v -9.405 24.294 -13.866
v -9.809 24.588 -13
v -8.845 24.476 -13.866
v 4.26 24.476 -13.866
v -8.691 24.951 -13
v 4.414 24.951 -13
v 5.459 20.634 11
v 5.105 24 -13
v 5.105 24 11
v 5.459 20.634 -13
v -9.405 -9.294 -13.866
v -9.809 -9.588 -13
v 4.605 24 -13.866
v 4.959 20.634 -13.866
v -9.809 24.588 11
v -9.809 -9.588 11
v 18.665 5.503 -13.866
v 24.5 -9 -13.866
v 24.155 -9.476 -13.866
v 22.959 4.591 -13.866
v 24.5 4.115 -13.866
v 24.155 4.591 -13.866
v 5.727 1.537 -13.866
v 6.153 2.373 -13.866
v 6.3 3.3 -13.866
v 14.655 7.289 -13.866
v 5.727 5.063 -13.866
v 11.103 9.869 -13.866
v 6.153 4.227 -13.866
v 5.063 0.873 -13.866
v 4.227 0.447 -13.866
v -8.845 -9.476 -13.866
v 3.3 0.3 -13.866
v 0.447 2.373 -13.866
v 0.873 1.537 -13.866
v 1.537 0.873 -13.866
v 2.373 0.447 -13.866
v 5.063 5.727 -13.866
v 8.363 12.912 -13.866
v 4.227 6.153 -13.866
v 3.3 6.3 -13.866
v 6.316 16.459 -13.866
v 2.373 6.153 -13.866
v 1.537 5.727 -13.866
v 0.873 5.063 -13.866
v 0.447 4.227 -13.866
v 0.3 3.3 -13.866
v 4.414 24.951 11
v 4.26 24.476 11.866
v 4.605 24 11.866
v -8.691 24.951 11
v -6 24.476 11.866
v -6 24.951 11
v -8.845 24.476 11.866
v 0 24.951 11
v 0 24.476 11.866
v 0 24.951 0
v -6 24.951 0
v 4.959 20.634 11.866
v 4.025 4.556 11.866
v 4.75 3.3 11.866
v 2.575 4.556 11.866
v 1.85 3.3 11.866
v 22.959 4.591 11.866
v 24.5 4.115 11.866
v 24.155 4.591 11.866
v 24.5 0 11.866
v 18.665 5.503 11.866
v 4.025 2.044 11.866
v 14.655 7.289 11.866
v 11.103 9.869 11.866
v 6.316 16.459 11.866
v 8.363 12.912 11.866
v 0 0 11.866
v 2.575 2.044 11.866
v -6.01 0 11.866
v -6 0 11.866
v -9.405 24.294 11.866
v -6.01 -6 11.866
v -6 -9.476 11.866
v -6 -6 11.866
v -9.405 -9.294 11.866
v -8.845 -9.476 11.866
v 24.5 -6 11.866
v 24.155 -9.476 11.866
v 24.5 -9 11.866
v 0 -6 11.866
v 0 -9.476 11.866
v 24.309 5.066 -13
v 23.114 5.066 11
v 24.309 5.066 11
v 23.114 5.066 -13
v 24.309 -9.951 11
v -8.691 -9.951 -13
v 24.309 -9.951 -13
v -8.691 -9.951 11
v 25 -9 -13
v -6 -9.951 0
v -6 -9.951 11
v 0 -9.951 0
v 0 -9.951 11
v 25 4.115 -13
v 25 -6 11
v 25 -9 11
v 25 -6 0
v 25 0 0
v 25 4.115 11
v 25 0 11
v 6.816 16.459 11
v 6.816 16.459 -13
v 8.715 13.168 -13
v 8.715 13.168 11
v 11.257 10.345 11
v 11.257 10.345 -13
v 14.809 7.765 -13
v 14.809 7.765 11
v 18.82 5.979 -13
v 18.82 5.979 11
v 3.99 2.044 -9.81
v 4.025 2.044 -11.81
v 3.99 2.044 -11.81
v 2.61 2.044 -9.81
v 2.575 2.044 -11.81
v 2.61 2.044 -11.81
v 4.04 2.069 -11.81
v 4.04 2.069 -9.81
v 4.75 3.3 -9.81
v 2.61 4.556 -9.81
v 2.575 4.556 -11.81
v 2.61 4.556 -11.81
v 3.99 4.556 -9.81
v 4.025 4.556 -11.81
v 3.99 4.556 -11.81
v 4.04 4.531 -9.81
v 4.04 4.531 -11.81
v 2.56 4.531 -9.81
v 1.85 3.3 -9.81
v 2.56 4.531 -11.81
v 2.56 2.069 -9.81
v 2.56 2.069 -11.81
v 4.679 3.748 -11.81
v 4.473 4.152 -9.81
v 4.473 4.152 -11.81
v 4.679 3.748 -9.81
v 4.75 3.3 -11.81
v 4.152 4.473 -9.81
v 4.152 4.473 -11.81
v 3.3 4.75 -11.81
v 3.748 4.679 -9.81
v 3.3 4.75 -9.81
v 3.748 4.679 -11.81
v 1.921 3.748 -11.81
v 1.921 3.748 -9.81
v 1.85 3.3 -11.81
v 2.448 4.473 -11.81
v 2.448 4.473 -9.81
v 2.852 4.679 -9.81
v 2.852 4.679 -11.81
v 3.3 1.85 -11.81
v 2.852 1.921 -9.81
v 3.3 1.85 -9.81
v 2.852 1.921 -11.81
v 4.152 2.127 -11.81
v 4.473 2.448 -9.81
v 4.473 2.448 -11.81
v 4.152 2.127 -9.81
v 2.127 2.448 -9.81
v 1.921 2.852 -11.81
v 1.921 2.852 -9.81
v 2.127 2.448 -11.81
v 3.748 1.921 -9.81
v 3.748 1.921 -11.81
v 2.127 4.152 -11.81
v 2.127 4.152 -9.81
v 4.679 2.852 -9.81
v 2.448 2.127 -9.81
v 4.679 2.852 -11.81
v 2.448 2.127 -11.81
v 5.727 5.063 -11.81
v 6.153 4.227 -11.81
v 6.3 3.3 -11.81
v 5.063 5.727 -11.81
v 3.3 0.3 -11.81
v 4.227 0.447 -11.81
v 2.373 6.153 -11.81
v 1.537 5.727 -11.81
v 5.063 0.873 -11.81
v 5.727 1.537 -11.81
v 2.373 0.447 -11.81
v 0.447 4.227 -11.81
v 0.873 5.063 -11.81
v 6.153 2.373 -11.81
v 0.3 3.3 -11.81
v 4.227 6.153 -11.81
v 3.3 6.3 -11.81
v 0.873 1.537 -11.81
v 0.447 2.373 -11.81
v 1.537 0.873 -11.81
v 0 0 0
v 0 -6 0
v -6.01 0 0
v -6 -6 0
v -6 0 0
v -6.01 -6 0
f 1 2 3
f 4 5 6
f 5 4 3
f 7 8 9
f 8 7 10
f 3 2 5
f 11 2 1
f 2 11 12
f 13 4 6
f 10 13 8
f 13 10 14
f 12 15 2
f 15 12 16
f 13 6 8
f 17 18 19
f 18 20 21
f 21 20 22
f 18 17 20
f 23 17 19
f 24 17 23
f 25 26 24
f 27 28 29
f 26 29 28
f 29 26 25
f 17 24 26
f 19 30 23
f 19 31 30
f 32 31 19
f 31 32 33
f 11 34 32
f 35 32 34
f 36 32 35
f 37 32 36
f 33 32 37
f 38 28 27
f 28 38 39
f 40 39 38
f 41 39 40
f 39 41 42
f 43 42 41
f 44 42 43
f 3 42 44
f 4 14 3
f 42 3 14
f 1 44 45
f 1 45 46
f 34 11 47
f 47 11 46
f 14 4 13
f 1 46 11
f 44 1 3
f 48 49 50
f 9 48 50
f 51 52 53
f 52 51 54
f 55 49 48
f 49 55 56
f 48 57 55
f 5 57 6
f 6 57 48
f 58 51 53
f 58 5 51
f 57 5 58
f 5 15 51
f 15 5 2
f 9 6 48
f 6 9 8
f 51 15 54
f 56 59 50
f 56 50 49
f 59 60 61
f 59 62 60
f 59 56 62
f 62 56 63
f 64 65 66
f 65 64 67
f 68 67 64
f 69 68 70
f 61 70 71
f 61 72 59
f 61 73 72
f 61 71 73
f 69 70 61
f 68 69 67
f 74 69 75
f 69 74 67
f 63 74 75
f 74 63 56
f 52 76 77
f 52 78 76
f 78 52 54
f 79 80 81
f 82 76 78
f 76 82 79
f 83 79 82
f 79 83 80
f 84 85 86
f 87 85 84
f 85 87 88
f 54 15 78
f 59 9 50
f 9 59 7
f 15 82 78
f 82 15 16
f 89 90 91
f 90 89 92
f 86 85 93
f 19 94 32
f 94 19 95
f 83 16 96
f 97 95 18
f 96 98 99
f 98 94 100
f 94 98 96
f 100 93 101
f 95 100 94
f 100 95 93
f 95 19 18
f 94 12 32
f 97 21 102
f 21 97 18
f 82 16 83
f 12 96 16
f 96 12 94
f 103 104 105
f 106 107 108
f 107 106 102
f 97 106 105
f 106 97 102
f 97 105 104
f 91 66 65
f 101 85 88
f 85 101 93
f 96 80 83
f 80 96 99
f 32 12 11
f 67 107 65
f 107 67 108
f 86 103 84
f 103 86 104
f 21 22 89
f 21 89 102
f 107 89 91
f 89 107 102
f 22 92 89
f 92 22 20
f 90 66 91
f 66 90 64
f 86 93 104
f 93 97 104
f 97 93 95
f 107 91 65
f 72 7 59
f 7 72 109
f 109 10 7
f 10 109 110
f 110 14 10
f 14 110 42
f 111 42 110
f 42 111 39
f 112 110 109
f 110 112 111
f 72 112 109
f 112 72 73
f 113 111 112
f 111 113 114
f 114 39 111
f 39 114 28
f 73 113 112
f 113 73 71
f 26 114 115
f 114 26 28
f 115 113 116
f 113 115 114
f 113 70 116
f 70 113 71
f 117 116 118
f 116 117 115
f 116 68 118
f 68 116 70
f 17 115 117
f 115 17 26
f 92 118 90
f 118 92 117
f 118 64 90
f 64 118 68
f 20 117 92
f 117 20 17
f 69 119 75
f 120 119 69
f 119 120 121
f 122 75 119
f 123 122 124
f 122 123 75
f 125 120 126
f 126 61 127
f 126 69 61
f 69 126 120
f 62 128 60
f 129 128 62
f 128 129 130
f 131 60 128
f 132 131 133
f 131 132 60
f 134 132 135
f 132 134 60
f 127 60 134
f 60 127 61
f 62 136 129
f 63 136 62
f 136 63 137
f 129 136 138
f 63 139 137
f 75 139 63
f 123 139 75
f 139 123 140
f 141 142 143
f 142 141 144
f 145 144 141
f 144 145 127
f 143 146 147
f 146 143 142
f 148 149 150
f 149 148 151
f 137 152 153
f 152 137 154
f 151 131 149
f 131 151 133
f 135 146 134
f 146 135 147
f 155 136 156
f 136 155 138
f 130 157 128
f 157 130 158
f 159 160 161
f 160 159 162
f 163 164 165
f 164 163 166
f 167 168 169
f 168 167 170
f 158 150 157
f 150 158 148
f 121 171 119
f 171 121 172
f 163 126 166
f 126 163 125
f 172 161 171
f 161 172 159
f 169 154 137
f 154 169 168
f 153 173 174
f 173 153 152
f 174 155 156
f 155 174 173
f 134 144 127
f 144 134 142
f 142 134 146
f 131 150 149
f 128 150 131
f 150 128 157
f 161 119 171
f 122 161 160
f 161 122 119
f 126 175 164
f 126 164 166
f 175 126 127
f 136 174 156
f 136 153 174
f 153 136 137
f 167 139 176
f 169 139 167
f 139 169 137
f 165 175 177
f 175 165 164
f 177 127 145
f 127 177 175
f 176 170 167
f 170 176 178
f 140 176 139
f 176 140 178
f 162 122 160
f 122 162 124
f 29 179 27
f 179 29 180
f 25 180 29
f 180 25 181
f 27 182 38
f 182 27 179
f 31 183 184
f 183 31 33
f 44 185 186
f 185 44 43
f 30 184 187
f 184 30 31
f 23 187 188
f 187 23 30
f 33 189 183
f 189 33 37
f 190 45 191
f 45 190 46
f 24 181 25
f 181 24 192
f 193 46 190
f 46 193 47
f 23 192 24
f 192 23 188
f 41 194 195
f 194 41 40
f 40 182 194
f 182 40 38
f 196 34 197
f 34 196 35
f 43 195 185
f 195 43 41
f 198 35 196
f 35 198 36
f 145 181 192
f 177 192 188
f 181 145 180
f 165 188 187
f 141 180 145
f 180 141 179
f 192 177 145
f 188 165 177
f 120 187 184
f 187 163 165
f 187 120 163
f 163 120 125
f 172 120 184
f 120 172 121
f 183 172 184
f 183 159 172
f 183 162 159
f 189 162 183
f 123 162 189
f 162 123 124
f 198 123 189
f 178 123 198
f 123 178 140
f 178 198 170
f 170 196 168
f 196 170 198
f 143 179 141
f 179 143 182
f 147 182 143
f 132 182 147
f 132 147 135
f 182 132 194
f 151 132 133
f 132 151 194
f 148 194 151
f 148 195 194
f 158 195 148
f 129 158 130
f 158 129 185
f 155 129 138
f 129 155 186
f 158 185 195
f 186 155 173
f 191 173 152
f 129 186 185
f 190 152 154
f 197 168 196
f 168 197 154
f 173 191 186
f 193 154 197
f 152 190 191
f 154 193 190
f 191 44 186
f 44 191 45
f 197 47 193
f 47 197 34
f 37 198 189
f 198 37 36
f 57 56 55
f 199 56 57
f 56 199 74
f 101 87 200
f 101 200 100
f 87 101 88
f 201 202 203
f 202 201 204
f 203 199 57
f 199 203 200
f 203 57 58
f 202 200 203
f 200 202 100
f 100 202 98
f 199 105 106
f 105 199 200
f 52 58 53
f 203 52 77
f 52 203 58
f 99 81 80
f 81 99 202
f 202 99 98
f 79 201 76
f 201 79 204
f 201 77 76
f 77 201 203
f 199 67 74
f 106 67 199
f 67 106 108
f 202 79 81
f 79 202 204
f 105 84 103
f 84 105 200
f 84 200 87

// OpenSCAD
// The real added height
bottomHeight=14;

// Internal height (snug fit)
internalHeight=12;

// Rounded corner radius
roundness=1;

// How big is the thing in the horizontal plane
cubeSide= 25;

// Wall thickness
outSide= 4;

// Plywood thickness
plyWidth= 6;



// This is rev 2 for thingiverse customizer
// MoonCactus / jeremie.francois@gmail.com / betterprinter.blogspot.com

// The screw data match a standard UM spare
screwDiameter=2.9+0;
screwDistToWalls=0.8+0;
screwHeadDiameter=6+0;
screwHeadDepth=2.2+0;

tol=0.01+0;

translate([-plyWidth-outSide,-plyWidth-outSide,0])
{
	difference()
	{

		minkowski()
		{
			sphere(r=1); // round the main body shape
			difference()
			{

				// Main body
				translate([roundness,roundness,-bottomHeight+roundness])
					cube([cubeSide + plyWidth + outSide -roundness*2, cubeSide + plyWidth + outSide -roundness*2, internalHeight+bottomHeight -roundness*2]);
				// Main cylinder removal
				translate([cubeSide + plyWidth + outSide, cubeSide + plyWidth + outSide,-bottomHeight+roundness-tol])
					cylinder(r=cubeSide-outSide, h=internalHeight+bottomHeight-roundness*2+tol*2);
			}
		}

		// The two grooves (one of them being blind on one side)
		translate([outSide,-tol,0]) cube([plyWidth, cubeSide+plyWidth+outSide+tol*2, internalHeight+tol]);
		translate([-tol+outSide,outSide,0]) cube([cubeSide+plyWidth+tol*2, plyWidth, internalHeight+tol]);

		// Hole for a screw to attach a rubber pad AND to pushes the feet wals against that of the UM for stickier fit
		translate([cubeSide/2+screwDistToWalls, cubeSide/2+screwDistToWalls,-bottomHeight-tol])
		{
			cylinder(r=screwDiameter/2, h=internalHeight+bottomHeight+tol*2, $fn=6);
			cylinder(r=screwDiameter/2, h=screwHeadDepth+2, $fn=20); // 2 easy millimeters to facilitate screwing the screw 
			cylinder(r=screwHeadDiameter/2, h=screwHeadDepth, $fn=20);
		}		


	}
}
